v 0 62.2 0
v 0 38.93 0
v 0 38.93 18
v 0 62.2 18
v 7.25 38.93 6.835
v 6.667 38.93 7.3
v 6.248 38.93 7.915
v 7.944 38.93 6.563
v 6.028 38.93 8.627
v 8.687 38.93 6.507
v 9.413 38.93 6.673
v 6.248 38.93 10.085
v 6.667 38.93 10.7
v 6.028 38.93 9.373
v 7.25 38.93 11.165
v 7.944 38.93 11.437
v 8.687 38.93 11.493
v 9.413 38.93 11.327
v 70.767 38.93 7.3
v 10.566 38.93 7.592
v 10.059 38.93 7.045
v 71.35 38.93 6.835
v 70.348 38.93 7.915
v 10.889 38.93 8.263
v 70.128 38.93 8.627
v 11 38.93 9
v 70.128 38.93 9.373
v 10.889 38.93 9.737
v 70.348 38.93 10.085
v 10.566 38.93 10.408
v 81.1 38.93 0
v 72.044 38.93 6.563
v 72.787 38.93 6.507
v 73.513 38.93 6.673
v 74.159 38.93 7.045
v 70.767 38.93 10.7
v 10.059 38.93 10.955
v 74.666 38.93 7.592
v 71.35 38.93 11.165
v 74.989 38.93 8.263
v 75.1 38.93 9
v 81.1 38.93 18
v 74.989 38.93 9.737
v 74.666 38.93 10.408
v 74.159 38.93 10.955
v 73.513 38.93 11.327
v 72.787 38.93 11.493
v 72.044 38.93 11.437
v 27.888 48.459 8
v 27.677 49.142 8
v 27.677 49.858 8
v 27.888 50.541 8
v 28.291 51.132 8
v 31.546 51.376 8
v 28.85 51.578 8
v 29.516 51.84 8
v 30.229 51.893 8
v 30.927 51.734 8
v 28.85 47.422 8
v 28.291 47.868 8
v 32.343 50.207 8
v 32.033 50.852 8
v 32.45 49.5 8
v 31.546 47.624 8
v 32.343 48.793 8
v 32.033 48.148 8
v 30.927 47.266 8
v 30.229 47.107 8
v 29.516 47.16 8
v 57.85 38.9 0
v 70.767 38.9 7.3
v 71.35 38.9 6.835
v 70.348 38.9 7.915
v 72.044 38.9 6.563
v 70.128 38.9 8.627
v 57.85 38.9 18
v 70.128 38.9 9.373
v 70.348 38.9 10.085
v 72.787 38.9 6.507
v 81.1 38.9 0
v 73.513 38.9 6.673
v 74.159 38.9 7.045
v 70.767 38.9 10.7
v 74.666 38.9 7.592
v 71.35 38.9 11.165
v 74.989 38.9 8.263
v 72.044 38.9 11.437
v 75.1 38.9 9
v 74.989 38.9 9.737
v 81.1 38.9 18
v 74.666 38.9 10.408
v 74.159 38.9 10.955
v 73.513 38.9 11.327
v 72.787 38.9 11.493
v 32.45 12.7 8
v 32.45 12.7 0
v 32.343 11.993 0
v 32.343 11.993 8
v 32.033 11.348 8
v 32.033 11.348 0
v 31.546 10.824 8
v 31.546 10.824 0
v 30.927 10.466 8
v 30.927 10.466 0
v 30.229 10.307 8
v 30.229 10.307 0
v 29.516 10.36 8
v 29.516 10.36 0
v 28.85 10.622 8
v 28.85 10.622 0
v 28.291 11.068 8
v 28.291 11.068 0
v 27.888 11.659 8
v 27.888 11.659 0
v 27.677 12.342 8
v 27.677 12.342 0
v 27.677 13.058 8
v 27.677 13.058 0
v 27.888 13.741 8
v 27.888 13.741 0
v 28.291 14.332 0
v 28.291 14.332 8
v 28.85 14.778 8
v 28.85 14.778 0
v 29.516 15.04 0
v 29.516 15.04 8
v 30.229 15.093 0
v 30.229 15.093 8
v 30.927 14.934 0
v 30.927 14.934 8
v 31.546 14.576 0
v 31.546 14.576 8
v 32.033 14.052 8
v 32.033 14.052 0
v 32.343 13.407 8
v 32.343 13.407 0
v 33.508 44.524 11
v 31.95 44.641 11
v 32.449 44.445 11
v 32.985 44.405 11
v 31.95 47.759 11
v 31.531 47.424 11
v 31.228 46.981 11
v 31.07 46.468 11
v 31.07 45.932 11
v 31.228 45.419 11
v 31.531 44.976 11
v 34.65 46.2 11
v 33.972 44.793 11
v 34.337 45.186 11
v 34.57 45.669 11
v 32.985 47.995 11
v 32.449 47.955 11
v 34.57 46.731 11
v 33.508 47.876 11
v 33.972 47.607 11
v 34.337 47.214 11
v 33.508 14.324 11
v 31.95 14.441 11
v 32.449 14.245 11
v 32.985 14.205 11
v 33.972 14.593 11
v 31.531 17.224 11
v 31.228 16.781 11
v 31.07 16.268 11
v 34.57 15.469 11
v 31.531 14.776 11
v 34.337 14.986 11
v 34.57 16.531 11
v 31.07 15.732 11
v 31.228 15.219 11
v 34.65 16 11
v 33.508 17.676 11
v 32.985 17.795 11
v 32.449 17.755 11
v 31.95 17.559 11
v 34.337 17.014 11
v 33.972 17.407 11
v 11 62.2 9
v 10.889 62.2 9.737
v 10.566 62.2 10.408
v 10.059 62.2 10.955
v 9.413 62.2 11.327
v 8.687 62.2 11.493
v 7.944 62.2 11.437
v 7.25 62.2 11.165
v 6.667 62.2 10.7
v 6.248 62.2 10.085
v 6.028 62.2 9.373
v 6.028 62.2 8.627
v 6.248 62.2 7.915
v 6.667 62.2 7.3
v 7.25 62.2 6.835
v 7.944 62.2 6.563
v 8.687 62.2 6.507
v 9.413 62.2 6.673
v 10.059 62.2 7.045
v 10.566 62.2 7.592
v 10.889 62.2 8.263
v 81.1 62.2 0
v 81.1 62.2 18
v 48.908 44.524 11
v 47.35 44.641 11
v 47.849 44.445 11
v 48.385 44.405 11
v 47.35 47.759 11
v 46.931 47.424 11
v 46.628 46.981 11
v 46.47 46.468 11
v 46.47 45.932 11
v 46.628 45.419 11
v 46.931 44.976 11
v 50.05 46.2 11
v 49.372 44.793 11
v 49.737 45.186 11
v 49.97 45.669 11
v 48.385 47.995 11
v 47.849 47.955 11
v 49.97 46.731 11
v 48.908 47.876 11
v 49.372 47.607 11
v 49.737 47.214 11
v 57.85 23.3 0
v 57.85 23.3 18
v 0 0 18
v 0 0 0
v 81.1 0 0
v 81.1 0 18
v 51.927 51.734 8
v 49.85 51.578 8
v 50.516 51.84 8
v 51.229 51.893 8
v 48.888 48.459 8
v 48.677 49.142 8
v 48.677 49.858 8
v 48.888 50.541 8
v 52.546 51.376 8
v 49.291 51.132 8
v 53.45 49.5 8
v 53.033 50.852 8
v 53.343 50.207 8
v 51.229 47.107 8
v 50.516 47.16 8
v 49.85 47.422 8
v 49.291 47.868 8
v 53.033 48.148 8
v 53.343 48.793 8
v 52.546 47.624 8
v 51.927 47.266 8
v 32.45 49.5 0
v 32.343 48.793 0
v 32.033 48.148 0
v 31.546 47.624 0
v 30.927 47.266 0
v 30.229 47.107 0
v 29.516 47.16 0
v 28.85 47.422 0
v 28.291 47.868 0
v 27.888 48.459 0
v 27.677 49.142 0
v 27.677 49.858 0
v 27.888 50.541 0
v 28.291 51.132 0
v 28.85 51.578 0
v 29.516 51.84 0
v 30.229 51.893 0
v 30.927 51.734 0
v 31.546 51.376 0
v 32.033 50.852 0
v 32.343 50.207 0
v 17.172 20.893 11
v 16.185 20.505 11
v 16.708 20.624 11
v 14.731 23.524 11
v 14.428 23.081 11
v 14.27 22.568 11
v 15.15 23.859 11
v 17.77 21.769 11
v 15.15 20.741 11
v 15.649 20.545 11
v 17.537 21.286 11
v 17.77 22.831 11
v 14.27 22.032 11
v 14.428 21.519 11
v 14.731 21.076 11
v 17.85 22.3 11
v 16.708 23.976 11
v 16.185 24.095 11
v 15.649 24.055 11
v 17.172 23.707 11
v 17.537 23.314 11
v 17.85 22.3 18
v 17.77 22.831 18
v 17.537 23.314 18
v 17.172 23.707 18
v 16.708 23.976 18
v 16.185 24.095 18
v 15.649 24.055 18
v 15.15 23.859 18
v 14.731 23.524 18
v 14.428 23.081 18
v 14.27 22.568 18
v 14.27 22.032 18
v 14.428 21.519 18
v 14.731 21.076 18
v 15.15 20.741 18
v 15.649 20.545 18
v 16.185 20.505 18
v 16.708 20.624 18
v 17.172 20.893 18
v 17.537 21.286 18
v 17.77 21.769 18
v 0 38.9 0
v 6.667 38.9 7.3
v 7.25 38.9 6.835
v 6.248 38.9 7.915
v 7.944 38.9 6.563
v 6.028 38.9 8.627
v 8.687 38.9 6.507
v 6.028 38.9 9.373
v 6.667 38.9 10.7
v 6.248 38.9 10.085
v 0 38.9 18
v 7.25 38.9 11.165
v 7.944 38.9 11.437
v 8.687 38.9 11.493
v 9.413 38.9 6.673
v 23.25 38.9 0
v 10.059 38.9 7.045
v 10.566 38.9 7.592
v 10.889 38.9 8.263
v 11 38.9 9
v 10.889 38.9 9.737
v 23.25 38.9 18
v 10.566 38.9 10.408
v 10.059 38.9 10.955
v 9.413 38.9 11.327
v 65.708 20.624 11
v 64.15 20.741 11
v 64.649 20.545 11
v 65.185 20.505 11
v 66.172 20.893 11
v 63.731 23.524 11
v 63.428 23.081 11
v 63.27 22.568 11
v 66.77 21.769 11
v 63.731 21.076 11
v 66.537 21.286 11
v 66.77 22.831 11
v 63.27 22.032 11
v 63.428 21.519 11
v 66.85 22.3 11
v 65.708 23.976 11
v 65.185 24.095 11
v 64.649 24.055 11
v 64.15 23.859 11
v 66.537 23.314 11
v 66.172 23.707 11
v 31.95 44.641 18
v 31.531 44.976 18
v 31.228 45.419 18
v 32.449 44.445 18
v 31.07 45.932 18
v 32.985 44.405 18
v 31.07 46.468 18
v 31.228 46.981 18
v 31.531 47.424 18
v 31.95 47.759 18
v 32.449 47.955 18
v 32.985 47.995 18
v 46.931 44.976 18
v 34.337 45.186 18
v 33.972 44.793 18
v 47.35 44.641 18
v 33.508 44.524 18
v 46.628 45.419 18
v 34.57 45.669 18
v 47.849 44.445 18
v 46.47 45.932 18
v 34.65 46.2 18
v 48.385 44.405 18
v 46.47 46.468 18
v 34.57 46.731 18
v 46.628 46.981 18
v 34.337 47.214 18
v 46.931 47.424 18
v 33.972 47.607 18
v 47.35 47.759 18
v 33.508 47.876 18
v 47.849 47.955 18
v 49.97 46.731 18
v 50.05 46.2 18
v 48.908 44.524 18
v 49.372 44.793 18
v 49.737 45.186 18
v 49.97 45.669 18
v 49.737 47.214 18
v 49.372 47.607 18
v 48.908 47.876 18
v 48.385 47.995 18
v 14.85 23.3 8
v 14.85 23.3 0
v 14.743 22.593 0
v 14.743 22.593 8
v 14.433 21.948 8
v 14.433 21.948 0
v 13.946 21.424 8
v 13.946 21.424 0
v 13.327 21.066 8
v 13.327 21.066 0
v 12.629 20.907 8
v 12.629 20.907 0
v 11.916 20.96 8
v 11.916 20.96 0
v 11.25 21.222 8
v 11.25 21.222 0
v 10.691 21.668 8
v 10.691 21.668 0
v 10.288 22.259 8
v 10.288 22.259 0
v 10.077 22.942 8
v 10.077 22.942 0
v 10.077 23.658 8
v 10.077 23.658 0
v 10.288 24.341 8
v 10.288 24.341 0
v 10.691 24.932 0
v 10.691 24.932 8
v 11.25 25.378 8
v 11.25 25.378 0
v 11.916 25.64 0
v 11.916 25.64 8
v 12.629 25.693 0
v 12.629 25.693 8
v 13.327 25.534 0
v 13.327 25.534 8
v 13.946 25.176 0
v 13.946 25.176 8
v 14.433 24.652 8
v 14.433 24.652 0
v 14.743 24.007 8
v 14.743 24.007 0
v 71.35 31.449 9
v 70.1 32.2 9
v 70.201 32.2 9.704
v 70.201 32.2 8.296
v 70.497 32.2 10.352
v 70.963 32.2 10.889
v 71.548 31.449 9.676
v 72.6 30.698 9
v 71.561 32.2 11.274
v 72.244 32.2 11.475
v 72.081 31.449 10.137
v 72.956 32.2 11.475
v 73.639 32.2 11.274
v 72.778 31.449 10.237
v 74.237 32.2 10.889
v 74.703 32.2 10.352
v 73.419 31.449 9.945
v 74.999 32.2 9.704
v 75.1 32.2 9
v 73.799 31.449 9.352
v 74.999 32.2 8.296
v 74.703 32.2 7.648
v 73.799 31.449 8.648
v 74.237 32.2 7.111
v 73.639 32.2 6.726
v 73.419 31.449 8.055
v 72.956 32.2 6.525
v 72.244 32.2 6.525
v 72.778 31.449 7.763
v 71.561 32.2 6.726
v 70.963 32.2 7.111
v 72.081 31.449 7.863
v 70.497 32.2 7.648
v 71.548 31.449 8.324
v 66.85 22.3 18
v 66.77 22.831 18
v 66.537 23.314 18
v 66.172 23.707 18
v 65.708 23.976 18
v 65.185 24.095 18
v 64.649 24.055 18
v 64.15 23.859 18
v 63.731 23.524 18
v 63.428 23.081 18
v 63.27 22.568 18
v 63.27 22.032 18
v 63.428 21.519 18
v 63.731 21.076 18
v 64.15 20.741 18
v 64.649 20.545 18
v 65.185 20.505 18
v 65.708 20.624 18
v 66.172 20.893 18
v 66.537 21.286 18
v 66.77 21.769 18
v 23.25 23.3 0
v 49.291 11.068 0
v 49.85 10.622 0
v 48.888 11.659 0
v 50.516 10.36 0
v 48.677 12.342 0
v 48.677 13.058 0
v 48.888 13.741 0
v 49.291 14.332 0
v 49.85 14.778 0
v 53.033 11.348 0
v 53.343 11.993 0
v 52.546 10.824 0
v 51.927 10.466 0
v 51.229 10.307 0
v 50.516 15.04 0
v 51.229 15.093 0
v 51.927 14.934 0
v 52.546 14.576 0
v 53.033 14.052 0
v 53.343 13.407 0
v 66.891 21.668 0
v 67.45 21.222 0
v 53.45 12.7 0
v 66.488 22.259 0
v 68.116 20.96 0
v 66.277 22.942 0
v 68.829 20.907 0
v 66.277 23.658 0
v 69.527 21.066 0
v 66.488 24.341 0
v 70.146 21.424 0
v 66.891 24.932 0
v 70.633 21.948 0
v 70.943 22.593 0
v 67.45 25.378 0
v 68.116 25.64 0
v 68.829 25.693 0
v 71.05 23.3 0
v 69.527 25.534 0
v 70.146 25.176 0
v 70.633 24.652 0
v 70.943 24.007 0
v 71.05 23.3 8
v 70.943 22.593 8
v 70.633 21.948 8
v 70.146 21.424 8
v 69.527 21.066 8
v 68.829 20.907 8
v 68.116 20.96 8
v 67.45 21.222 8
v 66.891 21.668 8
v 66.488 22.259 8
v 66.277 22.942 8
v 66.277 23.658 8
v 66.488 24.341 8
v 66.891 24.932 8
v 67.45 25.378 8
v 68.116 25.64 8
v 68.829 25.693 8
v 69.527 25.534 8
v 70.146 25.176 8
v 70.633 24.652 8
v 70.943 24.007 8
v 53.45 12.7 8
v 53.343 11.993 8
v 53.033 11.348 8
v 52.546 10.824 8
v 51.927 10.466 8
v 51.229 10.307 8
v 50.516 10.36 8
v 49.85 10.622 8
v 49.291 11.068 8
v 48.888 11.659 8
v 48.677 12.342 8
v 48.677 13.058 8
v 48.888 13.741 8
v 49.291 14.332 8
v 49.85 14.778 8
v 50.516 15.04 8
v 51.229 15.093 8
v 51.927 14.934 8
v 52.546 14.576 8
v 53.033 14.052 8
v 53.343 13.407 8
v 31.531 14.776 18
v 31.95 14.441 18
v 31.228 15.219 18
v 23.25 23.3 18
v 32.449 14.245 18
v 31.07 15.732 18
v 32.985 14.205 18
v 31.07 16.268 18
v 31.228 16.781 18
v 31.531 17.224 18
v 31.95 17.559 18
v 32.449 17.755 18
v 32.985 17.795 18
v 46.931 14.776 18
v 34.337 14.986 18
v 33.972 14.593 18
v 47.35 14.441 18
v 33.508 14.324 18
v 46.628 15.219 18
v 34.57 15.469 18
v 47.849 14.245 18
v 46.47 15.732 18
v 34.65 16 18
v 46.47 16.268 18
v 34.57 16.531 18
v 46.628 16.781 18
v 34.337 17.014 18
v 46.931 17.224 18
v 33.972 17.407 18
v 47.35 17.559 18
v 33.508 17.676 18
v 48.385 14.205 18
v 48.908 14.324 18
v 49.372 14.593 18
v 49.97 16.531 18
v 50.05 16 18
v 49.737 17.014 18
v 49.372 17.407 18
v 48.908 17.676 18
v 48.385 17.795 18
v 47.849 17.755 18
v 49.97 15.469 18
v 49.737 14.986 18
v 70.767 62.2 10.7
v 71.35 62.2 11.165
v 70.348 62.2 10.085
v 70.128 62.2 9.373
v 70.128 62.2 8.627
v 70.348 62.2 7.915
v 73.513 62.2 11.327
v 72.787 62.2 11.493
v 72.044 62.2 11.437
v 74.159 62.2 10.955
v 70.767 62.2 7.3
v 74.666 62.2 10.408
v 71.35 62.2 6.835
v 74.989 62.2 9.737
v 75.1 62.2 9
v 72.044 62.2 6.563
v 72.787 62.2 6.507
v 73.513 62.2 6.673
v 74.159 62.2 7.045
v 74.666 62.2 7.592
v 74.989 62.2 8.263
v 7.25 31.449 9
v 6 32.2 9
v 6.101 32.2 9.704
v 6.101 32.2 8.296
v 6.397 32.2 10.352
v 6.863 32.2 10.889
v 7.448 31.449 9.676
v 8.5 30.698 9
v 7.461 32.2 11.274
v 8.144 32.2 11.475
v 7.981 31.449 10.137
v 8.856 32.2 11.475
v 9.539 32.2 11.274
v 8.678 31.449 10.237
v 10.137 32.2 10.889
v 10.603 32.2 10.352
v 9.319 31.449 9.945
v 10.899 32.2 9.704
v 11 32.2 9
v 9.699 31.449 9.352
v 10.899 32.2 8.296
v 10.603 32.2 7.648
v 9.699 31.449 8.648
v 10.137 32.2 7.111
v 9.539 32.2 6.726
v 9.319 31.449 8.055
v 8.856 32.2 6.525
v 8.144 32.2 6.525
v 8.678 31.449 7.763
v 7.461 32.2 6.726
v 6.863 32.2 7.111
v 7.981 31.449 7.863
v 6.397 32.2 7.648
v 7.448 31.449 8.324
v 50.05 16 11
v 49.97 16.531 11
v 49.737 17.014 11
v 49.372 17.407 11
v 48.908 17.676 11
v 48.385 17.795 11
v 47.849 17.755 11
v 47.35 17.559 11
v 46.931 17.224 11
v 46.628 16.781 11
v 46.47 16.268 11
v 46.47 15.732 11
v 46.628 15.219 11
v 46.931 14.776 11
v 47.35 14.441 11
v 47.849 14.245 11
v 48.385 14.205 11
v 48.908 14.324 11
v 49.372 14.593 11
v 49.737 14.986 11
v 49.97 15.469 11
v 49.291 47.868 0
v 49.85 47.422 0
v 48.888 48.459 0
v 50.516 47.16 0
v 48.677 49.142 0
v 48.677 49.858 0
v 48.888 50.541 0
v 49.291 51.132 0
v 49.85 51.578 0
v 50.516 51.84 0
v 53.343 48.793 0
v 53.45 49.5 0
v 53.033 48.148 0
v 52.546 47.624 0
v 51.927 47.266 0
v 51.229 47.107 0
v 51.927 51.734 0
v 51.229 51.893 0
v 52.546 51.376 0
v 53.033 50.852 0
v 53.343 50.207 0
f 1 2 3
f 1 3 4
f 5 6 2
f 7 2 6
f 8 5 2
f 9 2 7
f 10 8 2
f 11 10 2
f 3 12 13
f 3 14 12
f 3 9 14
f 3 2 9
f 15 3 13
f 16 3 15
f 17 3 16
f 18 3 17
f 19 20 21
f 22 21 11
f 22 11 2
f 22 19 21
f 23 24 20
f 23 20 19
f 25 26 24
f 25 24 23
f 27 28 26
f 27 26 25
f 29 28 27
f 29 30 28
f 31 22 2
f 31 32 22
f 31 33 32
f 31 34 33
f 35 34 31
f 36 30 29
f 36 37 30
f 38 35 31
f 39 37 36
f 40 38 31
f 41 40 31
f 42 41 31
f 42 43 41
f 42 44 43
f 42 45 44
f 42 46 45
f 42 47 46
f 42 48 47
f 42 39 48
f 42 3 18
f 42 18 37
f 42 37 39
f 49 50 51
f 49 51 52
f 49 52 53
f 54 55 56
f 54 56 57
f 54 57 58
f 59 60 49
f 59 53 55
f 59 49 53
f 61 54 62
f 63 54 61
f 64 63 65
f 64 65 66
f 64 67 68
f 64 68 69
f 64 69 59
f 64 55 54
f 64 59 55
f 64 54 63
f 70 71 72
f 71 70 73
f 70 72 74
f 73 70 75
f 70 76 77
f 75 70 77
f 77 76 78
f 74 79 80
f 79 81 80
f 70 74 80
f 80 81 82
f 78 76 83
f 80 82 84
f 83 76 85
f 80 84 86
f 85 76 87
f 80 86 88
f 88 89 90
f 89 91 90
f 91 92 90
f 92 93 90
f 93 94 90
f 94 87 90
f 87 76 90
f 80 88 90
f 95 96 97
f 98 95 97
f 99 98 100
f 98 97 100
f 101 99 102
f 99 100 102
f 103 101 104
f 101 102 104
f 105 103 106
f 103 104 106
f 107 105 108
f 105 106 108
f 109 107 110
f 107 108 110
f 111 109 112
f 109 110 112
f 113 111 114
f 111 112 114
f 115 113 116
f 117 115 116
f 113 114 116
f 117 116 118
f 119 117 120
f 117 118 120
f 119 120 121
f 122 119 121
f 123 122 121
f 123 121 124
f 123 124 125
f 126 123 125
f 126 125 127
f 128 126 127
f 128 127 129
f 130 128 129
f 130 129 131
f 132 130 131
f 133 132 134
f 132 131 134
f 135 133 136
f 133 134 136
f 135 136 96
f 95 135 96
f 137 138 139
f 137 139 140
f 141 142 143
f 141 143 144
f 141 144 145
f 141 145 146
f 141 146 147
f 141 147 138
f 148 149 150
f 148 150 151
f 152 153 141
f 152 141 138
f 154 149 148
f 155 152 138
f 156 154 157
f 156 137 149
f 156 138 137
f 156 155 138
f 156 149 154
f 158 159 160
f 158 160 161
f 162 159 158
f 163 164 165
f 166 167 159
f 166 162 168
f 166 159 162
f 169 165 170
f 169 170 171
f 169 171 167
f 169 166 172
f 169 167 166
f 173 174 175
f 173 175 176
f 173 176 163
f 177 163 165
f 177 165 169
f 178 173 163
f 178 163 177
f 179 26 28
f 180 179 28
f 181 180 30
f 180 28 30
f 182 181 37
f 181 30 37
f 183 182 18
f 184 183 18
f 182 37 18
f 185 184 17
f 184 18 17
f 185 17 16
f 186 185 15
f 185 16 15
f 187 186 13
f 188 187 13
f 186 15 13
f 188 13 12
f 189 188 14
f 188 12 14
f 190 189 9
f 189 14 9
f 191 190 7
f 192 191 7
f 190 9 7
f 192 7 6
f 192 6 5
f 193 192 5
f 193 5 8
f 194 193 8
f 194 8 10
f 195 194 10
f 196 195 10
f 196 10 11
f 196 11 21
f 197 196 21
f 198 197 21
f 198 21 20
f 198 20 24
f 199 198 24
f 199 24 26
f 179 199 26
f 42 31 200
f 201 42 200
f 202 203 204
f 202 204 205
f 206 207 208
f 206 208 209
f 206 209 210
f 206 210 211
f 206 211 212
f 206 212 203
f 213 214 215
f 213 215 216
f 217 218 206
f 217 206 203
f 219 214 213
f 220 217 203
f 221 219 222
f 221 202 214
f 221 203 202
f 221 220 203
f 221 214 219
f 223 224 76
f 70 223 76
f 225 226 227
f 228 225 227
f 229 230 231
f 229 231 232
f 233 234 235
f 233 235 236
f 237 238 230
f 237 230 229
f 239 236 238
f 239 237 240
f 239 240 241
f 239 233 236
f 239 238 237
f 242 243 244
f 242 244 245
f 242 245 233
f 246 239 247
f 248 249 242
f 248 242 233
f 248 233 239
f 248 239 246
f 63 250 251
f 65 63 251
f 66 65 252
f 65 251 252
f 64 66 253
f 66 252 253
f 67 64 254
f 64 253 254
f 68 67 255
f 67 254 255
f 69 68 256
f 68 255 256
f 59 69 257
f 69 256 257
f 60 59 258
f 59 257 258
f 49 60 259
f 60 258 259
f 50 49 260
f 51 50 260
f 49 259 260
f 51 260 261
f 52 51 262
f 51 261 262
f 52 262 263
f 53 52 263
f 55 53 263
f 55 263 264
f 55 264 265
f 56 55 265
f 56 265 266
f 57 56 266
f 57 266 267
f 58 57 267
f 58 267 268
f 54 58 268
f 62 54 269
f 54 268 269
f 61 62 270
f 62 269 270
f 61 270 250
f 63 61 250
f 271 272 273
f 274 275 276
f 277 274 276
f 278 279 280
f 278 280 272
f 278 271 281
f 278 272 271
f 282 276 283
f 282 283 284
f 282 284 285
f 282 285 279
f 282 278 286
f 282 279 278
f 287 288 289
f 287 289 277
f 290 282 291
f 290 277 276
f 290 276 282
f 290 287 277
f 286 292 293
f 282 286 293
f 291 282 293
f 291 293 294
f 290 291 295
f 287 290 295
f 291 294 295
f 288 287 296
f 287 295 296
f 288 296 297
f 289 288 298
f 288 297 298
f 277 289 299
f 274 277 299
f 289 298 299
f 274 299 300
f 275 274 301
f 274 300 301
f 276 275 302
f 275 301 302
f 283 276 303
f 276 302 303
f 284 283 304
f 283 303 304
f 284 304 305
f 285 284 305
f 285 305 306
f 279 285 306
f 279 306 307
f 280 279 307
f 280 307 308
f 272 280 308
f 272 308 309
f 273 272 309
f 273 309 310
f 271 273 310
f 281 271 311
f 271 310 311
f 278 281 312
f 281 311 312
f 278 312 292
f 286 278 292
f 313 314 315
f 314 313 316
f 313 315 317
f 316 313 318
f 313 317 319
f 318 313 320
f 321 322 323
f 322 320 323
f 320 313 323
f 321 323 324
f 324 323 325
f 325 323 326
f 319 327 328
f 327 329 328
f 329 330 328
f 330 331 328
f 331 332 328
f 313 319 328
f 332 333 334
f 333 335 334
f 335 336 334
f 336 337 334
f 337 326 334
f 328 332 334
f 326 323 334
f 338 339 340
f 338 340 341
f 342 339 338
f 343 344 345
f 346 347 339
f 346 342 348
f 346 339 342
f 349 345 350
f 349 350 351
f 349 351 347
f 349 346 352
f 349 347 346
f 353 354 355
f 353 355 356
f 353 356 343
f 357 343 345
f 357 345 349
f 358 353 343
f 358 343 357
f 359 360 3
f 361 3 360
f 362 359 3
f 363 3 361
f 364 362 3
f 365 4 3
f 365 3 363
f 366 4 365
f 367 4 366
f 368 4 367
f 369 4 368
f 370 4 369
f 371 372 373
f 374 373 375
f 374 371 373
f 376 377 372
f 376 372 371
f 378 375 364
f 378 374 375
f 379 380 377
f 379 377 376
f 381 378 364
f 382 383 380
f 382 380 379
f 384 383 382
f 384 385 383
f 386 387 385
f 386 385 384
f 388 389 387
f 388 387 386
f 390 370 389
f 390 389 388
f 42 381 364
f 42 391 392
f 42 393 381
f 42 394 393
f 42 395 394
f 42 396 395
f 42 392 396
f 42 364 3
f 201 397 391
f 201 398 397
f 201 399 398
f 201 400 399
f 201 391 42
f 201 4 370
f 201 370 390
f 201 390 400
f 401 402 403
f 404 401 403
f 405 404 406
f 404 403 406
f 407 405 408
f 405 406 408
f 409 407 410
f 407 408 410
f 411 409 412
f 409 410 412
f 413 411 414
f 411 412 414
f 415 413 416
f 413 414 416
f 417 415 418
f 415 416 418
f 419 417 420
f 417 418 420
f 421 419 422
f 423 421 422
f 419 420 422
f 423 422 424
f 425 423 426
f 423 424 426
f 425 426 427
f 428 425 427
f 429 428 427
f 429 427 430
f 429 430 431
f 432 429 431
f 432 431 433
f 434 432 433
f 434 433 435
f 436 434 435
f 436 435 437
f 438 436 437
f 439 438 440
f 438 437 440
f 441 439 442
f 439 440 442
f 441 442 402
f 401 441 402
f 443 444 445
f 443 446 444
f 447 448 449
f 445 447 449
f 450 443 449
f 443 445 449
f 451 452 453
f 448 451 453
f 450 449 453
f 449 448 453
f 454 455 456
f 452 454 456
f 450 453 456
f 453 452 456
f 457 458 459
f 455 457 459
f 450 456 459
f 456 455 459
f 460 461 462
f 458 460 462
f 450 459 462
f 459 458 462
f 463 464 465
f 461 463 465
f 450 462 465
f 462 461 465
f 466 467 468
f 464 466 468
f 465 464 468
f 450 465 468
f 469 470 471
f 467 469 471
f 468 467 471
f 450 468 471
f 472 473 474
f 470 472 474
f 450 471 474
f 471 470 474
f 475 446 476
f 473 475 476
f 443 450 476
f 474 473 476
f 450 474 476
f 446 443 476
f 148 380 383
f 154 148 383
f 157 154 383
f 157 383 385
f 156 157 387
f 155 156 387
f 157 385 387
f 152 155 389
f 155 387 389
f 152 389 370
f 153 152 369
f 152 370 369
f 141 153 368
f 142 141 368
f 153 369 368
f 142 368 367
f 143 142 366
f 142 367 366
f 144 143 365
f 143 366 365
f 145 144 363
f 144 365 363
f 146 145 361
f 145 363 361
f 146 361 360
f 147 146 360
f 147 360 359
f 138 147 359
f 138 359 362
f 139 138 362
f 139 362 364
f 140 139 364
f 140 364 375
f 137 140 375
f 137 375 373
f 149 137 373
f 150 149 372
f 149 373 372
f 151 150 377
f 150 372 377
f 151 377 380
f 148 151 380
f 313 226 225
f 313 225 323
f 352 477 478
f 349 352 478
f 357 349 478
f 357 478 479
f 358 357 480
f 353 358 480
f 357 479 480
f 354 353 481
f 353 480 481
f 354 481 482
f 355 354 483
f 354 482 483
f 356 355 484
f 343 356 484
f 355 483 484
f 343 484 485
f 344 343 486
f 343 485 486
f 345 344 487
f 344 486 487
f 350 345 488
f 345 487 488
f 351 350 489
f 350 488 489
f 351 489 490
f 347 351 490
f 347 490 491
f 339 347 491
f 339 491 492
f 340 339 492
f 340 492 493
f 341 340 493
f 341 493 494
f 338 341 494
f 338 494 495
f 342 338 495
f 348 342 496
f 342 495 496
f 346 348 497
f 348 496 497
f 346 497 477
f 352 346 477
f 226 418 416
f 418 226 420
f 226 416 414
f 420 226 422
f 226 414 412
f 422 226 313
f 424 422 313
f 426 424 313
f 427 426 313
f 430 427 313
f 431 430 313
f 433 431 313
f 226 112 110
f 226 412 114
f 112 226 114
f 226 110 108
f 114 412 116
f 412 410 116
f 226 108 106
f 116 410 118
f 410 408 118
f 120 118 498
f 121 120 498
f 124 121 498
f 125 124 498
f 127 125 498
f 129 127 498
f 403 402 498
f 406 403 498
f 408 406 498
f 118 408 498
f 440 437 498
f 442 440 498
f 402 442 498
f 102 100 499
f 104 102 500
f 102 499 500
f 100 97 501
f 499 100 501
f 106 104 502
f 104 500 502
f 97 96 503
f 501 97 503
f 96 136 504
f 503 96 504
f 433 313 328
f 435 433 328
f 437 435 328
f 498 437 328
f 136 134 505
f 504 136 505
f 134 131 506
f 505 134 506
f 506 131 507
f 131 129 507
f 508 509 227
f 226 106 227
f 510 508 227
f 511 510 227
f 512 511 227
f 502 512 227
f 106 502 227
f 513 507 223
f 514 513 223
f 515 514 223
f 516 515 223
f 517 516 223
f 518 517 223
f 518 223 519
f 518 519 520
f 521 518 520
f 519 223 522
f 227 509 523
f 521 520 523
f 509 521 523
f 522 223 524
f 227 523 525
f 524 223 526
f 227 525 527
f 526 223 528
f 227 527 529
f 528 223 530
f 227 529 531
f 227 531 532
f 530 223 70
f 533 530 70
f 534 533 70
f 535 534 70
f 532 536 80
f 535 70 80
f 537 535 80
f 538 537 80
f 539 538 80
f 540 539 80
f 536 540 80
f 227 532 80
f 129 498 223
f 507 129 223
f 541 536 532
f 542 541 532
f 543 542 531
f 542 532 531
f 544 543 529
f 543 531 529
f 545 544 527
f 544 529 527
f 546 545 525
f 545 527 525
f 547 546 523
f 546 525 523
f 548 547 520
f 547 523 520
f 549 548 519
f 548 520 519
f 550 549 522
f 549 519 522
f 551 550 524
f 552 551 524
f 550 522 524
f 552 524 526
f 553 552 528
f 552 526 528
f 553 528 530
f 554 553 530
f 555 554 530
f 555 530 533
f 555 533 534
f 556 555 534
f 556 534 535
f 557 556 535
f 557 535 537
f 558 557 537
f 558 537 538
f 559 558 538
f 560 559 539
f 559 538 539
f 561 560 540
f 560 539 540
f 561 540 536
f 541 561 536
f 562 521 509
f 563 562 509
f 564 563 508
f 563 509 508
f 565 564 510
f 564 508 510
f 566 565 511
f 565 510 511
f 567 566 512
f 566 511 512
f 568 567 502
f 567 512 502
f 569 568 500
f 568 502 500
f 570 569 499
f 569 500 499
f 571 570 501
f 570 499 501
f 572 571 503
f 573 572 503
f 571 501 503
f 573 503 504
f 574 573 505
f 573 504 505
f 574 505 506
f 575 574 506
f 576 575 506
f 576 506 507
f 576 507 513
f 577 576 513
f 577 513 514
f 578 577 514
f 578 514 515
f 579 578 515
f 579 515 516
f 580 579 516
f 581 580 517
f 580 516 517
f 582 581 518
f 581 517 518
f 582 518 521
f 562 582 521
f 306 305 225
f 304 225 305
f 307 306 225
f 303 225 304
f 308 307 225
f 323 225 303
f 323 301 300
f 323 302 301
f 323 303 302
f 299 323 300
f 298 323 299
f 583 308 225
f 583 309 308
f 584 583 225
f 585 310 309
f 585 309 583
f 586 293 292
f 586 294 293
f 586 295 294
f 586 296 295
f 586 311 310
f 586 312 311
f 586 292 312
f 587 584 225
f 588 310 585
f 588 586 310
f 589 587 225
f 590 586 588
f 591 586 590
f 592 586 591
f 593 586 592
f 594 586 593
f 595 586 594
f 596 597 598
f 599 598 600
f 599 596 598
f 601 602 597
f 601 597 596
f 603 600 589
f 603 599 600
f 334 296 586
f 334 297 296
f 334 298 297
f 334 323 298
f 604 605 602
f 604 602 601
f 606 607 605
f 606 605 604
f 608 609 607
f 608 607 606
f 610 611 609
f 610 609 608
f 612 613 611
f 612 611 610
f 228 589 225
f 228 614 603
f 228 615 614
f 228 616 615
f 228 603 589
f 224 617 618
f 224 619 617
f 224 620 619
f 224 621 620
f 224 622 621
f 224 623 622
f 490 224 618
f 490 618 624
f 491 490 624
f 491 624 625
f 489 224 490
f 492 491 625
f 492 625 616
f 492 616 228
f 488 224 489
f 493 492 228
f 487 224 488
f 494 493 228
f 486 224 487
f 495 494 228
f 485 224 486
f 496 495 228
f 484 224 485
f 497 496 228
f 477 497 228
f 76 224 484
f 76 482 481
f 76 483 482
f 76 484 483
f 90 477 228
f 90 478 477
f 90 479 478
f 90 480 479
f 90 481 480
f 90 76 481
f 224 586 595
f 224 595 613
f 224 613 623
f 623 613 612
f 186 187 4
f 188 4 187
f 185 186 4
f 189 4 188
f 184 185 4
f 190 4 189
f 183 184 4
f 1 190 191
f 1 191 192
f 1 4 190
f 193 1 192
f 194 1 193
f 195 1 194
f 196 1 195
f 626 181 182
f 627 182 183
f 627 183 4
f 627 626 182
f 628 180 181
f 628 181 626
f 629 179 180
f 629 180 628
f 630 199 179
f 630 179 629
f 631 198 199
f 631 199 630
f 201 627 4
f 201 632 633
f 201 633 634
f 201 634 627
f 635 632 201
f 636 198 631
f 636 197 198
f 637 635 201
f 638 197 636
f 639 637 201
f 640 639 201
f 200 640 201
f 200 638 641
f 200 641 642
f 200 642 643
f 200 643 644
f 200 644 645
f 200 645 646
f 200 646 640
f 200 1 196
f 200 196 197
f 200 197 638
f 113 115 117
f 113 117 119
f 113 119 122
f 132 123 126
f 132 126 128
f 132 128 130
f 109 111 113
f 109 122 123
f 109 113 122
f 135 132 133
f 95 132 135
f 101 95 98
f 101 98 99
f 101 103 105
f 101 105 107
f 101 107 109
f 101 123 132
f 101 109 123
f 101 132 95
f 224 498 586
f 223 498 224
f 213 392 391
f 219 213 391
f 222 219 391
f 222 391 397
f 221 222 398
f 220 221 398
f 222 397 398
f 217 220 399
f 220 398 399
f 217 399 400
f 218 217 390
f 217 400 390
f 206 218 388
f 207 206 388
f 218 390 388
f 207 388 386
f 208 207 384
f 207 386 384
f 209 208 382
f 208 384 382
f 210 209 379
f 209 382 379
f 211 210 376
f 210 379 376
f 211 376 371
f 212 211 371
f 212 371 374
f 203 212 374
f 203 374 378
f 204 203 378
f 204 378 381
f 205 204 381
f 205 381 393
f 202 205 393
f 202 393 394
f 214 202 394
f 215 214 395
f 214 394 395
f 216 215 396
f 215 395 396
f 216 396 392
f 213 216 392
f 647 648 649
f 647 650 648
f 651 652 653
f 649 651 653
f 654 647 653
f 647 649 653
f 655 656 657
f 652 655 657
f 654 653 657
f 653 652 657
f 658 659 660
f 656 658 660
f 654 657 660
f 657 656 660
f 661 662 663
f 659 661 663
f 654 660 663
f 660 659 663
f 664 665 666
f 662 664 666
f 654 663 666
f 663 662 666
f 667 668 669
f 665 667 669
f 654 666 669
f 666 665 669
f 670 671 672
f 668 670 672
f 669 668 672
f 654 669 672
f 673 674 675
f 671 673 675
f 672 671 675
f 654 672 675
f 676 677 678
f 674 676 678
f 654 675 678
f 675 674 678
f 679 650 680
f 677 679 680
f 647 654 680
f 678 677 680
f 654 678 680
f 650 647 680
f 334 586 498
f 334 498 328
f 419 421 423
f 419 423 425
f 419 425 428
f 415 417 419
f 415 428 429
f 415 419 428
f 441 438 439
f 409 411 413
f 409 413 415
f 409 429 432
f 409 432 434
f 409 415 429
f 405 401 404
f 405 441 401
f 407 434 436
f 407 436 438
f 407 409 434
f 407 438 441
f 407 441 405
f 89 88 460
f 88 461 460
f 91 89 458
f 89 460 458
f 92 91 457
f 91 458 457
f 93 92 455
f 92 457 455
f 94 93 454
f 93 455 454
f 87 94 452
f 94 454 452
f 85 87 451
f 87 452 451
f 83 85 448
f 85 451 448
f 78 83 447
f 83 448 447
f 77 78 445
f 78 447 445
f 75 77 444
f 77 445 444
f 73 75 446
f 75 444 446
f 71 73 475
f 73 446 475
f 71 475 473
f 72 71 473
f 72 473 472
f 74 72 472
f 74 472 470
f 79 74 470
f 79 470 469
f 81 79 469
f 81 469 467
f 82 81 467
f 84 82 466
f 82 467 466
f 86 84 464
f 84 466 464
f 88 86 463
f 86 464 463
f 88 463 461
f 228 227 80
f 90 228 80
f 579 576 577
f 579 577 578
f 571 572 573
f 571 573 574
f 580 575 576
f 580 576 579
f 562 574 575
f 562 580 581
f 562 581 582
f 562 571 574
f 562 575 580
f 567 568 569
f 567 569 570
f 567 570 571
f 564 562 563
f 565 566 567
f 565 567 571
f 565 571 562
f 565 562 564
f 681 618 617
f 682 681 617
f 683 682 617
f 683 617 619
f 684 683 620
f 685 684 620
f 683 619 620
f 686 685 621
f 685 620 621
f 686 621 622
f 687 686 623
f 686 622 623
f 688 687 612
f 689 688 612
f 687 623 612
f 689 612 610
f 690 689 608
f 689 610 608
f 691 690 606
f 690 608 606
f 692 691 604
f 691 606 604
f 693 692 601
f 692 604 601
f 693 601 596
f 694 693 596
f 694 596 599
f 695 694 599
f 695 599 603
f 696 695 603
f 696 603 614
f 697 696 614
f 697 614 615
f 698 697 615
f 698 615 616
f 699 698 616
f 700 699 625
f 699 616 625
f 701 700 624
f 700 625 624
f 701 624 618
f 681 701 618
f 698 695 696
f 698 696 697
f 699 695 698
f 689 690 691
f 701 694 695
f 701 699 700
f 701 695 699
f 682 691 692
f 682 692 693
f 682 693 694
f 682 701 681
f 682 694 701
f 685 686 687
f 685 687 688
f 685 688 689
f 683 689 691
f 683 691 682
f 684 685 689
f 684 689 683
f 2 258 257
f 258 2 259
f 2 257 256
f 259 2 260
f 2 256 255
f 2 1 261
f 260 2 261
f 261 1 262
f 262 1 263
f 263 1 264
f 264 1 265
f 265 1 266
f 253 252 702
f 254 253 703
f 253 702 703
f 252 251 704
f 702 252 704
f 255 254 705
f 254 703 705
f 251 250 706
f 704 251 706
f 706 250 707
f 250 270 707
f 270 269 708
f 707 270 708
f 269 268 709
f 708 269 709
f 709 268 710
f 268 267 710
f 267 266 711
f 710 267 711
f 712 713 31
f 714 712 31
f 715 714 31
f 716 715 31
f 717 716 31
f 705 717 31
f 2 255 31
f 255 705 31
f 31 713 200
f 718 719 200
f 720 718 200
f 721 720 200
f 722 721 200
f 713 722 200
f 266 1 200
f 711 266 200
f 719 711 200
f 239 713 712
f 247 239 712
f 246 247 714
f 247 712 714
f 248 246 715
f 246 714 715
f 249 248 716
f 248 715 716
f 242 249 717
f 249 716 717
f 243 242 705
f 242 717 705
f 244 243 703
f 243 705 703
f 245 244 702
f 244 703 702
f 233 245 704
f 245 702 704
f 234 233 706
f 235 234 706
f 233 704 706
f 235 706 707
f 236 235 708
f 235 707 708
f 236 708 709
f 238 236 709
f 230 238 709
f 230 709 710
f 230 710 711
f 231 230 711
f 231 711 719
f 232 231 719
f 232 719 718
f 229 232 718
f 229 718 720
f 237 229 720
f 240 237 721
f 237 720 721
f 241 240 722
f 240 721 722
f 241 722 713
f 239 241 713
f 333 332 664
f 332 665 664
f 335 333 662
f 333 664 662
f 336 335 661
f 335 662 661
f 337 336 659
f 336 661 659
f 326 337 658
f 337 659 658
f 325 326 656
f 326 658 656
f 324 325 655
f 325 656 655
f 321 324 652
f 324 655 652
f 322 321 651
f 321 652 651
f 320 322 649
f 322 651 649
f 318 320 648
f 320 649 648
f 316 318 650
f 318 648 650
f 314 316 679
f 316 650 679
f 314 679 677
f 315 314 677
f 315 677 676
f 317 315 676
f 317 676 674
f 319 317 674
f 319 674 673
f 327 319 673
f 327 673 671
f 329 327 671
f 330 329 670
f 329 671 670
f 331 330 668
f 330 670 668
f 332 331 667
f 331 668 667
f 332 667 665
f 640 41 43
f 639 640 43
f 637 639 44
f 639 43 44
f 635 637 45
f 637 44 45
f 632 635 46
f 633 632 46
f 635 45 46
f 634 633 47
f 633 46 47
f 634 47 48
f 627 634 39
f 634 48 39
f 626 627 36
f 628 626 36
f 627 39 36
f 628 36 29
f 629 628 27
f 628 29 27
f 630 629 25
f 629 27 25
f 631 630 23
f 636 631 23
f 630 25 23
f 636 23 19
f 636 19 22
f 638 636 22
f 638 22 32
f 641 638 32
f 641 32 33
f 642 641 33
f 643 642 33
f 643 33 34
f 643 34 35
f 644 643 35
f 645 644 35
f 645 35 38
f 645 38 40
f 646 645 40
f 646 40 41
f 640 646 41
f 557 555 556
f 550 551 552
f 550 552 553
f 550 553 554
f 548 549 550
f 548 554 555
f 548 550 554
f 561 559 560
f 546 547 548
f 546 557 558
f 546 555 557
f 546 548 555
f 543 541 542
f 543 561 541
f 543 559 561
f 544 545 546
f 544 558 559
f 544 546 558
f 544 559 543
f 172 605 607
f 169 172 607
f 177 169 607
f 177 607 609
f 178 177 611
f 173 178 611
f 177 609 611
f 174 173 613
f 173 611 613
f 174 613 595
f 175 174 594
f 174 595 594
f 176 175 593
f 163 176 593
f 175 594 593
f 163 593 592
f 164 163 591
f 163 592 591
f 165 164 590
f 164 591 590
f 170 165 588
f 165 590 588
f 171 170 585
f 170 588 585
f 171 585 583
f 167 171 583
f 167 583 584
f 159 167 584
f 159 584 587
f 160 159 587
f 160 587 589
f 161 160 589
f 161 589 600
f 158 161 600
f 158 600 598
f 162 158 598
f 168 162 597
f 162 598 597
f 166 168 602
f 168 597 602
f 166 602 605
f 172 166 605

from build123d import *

# Parameters (mm, degrees)
F0_W     = 81.1
F0_H     = 62.2
F0_W_2   = 34.6
F0_H_2   = 15.6
F1_DEPTH = 18
F2_R     = 1.8
F3_DEPTH = 7
F4_R     = 2.4
F5_DEPTH = 8
F6_W     = 81.1
F6_H     = 0.03
F7_DEPTH = 18.001
F9_D     = 5
F9_DEPTH = 30
F9_TIP   = 1.5021515476


with BuildPart() as f1:
    # F0 (on Top) → F1 (new body)
    with BuildSketch(Plane.XY):
        with Locations((40.55, 31.1)):
            Rectangle(F0_W, F0_H)
        with Locations((40.55, 31.1)):
            Rectangle(F0_W_2, F0_H_2, mode=Mode.SUBTRACT)
    extrude(amount=F1_DEPTH)

    # F2 (on face) → F3 (cut)
    with BuildSketch(Plane.XY.offset(18)):
        with Locations((32.85, 46.2)):
            Circle(F2_R)
        with Locations((48.25, 46.2)):
            Circle(F2_R)
        with Locations((65.05, 22.3)):
            Circle(F2_R)
        with Locations((48.25, 16)):
            Circle(F2_R)
        with Locations((32.85, 16)):
            Circle(F2_R)
        with Locations((16.05, 22.3)):
            Circle(F2_R)
    extrude(amount=-F3_DEPTH, mode=Mode.SUBTRACT)

    # F4 (on face) → F5 (cut)
    with BuildSketch(Plane(origin=(0, 0, 0), x_dir=(1, 0, 0), z_dir=(0, 0, -1))):
        with Locations((51.05, -49.5)):
            Circle(F4_R)
        with Locations((30.05, -49.5)):
            Circle(F4_R)
        with Locations((12.45, -23.3)):
            Circle(F4_R)
        with Locations((30.05, -12.7)):
            Circle(F4_R)
        with Locations((51.05, -12.7)):
            Circle(F4_R)
        with Locations((68.65, -23.3)):
            Circle(F4_R)
    extrude(amount=-F5_DEPTH, mode=Mode.SUBTRACT)

    # F6 (on face) → F7 (cut, through all)
    with BuildSketch(Plane.XY.offset(18)):
        with Locations((40.55, 38.915)):
            Rectangle(F6_W, F6_H)
    extrude(amount=-F7_DEPTH, mode=Mode.SUBTRACT)

    # F9
    with Locations(Plane(origin=(0, 62.2, 0), x_dir=(-1, 0, 0), z_dir=(0, 1, 0))):
        with Locations((-8.5, 9), (-72.6, 9)):
            Hole(F9_D / 2, depth=F9_DEPTH)
            with Locations((0, 0, -(F9_DEPTH + F9_TIP / 2))):  # 118° drill point
                Cone(0, F9_D / 2, F9_TIP, mode=Mode.SUBTRACT)


solid = f1.part
